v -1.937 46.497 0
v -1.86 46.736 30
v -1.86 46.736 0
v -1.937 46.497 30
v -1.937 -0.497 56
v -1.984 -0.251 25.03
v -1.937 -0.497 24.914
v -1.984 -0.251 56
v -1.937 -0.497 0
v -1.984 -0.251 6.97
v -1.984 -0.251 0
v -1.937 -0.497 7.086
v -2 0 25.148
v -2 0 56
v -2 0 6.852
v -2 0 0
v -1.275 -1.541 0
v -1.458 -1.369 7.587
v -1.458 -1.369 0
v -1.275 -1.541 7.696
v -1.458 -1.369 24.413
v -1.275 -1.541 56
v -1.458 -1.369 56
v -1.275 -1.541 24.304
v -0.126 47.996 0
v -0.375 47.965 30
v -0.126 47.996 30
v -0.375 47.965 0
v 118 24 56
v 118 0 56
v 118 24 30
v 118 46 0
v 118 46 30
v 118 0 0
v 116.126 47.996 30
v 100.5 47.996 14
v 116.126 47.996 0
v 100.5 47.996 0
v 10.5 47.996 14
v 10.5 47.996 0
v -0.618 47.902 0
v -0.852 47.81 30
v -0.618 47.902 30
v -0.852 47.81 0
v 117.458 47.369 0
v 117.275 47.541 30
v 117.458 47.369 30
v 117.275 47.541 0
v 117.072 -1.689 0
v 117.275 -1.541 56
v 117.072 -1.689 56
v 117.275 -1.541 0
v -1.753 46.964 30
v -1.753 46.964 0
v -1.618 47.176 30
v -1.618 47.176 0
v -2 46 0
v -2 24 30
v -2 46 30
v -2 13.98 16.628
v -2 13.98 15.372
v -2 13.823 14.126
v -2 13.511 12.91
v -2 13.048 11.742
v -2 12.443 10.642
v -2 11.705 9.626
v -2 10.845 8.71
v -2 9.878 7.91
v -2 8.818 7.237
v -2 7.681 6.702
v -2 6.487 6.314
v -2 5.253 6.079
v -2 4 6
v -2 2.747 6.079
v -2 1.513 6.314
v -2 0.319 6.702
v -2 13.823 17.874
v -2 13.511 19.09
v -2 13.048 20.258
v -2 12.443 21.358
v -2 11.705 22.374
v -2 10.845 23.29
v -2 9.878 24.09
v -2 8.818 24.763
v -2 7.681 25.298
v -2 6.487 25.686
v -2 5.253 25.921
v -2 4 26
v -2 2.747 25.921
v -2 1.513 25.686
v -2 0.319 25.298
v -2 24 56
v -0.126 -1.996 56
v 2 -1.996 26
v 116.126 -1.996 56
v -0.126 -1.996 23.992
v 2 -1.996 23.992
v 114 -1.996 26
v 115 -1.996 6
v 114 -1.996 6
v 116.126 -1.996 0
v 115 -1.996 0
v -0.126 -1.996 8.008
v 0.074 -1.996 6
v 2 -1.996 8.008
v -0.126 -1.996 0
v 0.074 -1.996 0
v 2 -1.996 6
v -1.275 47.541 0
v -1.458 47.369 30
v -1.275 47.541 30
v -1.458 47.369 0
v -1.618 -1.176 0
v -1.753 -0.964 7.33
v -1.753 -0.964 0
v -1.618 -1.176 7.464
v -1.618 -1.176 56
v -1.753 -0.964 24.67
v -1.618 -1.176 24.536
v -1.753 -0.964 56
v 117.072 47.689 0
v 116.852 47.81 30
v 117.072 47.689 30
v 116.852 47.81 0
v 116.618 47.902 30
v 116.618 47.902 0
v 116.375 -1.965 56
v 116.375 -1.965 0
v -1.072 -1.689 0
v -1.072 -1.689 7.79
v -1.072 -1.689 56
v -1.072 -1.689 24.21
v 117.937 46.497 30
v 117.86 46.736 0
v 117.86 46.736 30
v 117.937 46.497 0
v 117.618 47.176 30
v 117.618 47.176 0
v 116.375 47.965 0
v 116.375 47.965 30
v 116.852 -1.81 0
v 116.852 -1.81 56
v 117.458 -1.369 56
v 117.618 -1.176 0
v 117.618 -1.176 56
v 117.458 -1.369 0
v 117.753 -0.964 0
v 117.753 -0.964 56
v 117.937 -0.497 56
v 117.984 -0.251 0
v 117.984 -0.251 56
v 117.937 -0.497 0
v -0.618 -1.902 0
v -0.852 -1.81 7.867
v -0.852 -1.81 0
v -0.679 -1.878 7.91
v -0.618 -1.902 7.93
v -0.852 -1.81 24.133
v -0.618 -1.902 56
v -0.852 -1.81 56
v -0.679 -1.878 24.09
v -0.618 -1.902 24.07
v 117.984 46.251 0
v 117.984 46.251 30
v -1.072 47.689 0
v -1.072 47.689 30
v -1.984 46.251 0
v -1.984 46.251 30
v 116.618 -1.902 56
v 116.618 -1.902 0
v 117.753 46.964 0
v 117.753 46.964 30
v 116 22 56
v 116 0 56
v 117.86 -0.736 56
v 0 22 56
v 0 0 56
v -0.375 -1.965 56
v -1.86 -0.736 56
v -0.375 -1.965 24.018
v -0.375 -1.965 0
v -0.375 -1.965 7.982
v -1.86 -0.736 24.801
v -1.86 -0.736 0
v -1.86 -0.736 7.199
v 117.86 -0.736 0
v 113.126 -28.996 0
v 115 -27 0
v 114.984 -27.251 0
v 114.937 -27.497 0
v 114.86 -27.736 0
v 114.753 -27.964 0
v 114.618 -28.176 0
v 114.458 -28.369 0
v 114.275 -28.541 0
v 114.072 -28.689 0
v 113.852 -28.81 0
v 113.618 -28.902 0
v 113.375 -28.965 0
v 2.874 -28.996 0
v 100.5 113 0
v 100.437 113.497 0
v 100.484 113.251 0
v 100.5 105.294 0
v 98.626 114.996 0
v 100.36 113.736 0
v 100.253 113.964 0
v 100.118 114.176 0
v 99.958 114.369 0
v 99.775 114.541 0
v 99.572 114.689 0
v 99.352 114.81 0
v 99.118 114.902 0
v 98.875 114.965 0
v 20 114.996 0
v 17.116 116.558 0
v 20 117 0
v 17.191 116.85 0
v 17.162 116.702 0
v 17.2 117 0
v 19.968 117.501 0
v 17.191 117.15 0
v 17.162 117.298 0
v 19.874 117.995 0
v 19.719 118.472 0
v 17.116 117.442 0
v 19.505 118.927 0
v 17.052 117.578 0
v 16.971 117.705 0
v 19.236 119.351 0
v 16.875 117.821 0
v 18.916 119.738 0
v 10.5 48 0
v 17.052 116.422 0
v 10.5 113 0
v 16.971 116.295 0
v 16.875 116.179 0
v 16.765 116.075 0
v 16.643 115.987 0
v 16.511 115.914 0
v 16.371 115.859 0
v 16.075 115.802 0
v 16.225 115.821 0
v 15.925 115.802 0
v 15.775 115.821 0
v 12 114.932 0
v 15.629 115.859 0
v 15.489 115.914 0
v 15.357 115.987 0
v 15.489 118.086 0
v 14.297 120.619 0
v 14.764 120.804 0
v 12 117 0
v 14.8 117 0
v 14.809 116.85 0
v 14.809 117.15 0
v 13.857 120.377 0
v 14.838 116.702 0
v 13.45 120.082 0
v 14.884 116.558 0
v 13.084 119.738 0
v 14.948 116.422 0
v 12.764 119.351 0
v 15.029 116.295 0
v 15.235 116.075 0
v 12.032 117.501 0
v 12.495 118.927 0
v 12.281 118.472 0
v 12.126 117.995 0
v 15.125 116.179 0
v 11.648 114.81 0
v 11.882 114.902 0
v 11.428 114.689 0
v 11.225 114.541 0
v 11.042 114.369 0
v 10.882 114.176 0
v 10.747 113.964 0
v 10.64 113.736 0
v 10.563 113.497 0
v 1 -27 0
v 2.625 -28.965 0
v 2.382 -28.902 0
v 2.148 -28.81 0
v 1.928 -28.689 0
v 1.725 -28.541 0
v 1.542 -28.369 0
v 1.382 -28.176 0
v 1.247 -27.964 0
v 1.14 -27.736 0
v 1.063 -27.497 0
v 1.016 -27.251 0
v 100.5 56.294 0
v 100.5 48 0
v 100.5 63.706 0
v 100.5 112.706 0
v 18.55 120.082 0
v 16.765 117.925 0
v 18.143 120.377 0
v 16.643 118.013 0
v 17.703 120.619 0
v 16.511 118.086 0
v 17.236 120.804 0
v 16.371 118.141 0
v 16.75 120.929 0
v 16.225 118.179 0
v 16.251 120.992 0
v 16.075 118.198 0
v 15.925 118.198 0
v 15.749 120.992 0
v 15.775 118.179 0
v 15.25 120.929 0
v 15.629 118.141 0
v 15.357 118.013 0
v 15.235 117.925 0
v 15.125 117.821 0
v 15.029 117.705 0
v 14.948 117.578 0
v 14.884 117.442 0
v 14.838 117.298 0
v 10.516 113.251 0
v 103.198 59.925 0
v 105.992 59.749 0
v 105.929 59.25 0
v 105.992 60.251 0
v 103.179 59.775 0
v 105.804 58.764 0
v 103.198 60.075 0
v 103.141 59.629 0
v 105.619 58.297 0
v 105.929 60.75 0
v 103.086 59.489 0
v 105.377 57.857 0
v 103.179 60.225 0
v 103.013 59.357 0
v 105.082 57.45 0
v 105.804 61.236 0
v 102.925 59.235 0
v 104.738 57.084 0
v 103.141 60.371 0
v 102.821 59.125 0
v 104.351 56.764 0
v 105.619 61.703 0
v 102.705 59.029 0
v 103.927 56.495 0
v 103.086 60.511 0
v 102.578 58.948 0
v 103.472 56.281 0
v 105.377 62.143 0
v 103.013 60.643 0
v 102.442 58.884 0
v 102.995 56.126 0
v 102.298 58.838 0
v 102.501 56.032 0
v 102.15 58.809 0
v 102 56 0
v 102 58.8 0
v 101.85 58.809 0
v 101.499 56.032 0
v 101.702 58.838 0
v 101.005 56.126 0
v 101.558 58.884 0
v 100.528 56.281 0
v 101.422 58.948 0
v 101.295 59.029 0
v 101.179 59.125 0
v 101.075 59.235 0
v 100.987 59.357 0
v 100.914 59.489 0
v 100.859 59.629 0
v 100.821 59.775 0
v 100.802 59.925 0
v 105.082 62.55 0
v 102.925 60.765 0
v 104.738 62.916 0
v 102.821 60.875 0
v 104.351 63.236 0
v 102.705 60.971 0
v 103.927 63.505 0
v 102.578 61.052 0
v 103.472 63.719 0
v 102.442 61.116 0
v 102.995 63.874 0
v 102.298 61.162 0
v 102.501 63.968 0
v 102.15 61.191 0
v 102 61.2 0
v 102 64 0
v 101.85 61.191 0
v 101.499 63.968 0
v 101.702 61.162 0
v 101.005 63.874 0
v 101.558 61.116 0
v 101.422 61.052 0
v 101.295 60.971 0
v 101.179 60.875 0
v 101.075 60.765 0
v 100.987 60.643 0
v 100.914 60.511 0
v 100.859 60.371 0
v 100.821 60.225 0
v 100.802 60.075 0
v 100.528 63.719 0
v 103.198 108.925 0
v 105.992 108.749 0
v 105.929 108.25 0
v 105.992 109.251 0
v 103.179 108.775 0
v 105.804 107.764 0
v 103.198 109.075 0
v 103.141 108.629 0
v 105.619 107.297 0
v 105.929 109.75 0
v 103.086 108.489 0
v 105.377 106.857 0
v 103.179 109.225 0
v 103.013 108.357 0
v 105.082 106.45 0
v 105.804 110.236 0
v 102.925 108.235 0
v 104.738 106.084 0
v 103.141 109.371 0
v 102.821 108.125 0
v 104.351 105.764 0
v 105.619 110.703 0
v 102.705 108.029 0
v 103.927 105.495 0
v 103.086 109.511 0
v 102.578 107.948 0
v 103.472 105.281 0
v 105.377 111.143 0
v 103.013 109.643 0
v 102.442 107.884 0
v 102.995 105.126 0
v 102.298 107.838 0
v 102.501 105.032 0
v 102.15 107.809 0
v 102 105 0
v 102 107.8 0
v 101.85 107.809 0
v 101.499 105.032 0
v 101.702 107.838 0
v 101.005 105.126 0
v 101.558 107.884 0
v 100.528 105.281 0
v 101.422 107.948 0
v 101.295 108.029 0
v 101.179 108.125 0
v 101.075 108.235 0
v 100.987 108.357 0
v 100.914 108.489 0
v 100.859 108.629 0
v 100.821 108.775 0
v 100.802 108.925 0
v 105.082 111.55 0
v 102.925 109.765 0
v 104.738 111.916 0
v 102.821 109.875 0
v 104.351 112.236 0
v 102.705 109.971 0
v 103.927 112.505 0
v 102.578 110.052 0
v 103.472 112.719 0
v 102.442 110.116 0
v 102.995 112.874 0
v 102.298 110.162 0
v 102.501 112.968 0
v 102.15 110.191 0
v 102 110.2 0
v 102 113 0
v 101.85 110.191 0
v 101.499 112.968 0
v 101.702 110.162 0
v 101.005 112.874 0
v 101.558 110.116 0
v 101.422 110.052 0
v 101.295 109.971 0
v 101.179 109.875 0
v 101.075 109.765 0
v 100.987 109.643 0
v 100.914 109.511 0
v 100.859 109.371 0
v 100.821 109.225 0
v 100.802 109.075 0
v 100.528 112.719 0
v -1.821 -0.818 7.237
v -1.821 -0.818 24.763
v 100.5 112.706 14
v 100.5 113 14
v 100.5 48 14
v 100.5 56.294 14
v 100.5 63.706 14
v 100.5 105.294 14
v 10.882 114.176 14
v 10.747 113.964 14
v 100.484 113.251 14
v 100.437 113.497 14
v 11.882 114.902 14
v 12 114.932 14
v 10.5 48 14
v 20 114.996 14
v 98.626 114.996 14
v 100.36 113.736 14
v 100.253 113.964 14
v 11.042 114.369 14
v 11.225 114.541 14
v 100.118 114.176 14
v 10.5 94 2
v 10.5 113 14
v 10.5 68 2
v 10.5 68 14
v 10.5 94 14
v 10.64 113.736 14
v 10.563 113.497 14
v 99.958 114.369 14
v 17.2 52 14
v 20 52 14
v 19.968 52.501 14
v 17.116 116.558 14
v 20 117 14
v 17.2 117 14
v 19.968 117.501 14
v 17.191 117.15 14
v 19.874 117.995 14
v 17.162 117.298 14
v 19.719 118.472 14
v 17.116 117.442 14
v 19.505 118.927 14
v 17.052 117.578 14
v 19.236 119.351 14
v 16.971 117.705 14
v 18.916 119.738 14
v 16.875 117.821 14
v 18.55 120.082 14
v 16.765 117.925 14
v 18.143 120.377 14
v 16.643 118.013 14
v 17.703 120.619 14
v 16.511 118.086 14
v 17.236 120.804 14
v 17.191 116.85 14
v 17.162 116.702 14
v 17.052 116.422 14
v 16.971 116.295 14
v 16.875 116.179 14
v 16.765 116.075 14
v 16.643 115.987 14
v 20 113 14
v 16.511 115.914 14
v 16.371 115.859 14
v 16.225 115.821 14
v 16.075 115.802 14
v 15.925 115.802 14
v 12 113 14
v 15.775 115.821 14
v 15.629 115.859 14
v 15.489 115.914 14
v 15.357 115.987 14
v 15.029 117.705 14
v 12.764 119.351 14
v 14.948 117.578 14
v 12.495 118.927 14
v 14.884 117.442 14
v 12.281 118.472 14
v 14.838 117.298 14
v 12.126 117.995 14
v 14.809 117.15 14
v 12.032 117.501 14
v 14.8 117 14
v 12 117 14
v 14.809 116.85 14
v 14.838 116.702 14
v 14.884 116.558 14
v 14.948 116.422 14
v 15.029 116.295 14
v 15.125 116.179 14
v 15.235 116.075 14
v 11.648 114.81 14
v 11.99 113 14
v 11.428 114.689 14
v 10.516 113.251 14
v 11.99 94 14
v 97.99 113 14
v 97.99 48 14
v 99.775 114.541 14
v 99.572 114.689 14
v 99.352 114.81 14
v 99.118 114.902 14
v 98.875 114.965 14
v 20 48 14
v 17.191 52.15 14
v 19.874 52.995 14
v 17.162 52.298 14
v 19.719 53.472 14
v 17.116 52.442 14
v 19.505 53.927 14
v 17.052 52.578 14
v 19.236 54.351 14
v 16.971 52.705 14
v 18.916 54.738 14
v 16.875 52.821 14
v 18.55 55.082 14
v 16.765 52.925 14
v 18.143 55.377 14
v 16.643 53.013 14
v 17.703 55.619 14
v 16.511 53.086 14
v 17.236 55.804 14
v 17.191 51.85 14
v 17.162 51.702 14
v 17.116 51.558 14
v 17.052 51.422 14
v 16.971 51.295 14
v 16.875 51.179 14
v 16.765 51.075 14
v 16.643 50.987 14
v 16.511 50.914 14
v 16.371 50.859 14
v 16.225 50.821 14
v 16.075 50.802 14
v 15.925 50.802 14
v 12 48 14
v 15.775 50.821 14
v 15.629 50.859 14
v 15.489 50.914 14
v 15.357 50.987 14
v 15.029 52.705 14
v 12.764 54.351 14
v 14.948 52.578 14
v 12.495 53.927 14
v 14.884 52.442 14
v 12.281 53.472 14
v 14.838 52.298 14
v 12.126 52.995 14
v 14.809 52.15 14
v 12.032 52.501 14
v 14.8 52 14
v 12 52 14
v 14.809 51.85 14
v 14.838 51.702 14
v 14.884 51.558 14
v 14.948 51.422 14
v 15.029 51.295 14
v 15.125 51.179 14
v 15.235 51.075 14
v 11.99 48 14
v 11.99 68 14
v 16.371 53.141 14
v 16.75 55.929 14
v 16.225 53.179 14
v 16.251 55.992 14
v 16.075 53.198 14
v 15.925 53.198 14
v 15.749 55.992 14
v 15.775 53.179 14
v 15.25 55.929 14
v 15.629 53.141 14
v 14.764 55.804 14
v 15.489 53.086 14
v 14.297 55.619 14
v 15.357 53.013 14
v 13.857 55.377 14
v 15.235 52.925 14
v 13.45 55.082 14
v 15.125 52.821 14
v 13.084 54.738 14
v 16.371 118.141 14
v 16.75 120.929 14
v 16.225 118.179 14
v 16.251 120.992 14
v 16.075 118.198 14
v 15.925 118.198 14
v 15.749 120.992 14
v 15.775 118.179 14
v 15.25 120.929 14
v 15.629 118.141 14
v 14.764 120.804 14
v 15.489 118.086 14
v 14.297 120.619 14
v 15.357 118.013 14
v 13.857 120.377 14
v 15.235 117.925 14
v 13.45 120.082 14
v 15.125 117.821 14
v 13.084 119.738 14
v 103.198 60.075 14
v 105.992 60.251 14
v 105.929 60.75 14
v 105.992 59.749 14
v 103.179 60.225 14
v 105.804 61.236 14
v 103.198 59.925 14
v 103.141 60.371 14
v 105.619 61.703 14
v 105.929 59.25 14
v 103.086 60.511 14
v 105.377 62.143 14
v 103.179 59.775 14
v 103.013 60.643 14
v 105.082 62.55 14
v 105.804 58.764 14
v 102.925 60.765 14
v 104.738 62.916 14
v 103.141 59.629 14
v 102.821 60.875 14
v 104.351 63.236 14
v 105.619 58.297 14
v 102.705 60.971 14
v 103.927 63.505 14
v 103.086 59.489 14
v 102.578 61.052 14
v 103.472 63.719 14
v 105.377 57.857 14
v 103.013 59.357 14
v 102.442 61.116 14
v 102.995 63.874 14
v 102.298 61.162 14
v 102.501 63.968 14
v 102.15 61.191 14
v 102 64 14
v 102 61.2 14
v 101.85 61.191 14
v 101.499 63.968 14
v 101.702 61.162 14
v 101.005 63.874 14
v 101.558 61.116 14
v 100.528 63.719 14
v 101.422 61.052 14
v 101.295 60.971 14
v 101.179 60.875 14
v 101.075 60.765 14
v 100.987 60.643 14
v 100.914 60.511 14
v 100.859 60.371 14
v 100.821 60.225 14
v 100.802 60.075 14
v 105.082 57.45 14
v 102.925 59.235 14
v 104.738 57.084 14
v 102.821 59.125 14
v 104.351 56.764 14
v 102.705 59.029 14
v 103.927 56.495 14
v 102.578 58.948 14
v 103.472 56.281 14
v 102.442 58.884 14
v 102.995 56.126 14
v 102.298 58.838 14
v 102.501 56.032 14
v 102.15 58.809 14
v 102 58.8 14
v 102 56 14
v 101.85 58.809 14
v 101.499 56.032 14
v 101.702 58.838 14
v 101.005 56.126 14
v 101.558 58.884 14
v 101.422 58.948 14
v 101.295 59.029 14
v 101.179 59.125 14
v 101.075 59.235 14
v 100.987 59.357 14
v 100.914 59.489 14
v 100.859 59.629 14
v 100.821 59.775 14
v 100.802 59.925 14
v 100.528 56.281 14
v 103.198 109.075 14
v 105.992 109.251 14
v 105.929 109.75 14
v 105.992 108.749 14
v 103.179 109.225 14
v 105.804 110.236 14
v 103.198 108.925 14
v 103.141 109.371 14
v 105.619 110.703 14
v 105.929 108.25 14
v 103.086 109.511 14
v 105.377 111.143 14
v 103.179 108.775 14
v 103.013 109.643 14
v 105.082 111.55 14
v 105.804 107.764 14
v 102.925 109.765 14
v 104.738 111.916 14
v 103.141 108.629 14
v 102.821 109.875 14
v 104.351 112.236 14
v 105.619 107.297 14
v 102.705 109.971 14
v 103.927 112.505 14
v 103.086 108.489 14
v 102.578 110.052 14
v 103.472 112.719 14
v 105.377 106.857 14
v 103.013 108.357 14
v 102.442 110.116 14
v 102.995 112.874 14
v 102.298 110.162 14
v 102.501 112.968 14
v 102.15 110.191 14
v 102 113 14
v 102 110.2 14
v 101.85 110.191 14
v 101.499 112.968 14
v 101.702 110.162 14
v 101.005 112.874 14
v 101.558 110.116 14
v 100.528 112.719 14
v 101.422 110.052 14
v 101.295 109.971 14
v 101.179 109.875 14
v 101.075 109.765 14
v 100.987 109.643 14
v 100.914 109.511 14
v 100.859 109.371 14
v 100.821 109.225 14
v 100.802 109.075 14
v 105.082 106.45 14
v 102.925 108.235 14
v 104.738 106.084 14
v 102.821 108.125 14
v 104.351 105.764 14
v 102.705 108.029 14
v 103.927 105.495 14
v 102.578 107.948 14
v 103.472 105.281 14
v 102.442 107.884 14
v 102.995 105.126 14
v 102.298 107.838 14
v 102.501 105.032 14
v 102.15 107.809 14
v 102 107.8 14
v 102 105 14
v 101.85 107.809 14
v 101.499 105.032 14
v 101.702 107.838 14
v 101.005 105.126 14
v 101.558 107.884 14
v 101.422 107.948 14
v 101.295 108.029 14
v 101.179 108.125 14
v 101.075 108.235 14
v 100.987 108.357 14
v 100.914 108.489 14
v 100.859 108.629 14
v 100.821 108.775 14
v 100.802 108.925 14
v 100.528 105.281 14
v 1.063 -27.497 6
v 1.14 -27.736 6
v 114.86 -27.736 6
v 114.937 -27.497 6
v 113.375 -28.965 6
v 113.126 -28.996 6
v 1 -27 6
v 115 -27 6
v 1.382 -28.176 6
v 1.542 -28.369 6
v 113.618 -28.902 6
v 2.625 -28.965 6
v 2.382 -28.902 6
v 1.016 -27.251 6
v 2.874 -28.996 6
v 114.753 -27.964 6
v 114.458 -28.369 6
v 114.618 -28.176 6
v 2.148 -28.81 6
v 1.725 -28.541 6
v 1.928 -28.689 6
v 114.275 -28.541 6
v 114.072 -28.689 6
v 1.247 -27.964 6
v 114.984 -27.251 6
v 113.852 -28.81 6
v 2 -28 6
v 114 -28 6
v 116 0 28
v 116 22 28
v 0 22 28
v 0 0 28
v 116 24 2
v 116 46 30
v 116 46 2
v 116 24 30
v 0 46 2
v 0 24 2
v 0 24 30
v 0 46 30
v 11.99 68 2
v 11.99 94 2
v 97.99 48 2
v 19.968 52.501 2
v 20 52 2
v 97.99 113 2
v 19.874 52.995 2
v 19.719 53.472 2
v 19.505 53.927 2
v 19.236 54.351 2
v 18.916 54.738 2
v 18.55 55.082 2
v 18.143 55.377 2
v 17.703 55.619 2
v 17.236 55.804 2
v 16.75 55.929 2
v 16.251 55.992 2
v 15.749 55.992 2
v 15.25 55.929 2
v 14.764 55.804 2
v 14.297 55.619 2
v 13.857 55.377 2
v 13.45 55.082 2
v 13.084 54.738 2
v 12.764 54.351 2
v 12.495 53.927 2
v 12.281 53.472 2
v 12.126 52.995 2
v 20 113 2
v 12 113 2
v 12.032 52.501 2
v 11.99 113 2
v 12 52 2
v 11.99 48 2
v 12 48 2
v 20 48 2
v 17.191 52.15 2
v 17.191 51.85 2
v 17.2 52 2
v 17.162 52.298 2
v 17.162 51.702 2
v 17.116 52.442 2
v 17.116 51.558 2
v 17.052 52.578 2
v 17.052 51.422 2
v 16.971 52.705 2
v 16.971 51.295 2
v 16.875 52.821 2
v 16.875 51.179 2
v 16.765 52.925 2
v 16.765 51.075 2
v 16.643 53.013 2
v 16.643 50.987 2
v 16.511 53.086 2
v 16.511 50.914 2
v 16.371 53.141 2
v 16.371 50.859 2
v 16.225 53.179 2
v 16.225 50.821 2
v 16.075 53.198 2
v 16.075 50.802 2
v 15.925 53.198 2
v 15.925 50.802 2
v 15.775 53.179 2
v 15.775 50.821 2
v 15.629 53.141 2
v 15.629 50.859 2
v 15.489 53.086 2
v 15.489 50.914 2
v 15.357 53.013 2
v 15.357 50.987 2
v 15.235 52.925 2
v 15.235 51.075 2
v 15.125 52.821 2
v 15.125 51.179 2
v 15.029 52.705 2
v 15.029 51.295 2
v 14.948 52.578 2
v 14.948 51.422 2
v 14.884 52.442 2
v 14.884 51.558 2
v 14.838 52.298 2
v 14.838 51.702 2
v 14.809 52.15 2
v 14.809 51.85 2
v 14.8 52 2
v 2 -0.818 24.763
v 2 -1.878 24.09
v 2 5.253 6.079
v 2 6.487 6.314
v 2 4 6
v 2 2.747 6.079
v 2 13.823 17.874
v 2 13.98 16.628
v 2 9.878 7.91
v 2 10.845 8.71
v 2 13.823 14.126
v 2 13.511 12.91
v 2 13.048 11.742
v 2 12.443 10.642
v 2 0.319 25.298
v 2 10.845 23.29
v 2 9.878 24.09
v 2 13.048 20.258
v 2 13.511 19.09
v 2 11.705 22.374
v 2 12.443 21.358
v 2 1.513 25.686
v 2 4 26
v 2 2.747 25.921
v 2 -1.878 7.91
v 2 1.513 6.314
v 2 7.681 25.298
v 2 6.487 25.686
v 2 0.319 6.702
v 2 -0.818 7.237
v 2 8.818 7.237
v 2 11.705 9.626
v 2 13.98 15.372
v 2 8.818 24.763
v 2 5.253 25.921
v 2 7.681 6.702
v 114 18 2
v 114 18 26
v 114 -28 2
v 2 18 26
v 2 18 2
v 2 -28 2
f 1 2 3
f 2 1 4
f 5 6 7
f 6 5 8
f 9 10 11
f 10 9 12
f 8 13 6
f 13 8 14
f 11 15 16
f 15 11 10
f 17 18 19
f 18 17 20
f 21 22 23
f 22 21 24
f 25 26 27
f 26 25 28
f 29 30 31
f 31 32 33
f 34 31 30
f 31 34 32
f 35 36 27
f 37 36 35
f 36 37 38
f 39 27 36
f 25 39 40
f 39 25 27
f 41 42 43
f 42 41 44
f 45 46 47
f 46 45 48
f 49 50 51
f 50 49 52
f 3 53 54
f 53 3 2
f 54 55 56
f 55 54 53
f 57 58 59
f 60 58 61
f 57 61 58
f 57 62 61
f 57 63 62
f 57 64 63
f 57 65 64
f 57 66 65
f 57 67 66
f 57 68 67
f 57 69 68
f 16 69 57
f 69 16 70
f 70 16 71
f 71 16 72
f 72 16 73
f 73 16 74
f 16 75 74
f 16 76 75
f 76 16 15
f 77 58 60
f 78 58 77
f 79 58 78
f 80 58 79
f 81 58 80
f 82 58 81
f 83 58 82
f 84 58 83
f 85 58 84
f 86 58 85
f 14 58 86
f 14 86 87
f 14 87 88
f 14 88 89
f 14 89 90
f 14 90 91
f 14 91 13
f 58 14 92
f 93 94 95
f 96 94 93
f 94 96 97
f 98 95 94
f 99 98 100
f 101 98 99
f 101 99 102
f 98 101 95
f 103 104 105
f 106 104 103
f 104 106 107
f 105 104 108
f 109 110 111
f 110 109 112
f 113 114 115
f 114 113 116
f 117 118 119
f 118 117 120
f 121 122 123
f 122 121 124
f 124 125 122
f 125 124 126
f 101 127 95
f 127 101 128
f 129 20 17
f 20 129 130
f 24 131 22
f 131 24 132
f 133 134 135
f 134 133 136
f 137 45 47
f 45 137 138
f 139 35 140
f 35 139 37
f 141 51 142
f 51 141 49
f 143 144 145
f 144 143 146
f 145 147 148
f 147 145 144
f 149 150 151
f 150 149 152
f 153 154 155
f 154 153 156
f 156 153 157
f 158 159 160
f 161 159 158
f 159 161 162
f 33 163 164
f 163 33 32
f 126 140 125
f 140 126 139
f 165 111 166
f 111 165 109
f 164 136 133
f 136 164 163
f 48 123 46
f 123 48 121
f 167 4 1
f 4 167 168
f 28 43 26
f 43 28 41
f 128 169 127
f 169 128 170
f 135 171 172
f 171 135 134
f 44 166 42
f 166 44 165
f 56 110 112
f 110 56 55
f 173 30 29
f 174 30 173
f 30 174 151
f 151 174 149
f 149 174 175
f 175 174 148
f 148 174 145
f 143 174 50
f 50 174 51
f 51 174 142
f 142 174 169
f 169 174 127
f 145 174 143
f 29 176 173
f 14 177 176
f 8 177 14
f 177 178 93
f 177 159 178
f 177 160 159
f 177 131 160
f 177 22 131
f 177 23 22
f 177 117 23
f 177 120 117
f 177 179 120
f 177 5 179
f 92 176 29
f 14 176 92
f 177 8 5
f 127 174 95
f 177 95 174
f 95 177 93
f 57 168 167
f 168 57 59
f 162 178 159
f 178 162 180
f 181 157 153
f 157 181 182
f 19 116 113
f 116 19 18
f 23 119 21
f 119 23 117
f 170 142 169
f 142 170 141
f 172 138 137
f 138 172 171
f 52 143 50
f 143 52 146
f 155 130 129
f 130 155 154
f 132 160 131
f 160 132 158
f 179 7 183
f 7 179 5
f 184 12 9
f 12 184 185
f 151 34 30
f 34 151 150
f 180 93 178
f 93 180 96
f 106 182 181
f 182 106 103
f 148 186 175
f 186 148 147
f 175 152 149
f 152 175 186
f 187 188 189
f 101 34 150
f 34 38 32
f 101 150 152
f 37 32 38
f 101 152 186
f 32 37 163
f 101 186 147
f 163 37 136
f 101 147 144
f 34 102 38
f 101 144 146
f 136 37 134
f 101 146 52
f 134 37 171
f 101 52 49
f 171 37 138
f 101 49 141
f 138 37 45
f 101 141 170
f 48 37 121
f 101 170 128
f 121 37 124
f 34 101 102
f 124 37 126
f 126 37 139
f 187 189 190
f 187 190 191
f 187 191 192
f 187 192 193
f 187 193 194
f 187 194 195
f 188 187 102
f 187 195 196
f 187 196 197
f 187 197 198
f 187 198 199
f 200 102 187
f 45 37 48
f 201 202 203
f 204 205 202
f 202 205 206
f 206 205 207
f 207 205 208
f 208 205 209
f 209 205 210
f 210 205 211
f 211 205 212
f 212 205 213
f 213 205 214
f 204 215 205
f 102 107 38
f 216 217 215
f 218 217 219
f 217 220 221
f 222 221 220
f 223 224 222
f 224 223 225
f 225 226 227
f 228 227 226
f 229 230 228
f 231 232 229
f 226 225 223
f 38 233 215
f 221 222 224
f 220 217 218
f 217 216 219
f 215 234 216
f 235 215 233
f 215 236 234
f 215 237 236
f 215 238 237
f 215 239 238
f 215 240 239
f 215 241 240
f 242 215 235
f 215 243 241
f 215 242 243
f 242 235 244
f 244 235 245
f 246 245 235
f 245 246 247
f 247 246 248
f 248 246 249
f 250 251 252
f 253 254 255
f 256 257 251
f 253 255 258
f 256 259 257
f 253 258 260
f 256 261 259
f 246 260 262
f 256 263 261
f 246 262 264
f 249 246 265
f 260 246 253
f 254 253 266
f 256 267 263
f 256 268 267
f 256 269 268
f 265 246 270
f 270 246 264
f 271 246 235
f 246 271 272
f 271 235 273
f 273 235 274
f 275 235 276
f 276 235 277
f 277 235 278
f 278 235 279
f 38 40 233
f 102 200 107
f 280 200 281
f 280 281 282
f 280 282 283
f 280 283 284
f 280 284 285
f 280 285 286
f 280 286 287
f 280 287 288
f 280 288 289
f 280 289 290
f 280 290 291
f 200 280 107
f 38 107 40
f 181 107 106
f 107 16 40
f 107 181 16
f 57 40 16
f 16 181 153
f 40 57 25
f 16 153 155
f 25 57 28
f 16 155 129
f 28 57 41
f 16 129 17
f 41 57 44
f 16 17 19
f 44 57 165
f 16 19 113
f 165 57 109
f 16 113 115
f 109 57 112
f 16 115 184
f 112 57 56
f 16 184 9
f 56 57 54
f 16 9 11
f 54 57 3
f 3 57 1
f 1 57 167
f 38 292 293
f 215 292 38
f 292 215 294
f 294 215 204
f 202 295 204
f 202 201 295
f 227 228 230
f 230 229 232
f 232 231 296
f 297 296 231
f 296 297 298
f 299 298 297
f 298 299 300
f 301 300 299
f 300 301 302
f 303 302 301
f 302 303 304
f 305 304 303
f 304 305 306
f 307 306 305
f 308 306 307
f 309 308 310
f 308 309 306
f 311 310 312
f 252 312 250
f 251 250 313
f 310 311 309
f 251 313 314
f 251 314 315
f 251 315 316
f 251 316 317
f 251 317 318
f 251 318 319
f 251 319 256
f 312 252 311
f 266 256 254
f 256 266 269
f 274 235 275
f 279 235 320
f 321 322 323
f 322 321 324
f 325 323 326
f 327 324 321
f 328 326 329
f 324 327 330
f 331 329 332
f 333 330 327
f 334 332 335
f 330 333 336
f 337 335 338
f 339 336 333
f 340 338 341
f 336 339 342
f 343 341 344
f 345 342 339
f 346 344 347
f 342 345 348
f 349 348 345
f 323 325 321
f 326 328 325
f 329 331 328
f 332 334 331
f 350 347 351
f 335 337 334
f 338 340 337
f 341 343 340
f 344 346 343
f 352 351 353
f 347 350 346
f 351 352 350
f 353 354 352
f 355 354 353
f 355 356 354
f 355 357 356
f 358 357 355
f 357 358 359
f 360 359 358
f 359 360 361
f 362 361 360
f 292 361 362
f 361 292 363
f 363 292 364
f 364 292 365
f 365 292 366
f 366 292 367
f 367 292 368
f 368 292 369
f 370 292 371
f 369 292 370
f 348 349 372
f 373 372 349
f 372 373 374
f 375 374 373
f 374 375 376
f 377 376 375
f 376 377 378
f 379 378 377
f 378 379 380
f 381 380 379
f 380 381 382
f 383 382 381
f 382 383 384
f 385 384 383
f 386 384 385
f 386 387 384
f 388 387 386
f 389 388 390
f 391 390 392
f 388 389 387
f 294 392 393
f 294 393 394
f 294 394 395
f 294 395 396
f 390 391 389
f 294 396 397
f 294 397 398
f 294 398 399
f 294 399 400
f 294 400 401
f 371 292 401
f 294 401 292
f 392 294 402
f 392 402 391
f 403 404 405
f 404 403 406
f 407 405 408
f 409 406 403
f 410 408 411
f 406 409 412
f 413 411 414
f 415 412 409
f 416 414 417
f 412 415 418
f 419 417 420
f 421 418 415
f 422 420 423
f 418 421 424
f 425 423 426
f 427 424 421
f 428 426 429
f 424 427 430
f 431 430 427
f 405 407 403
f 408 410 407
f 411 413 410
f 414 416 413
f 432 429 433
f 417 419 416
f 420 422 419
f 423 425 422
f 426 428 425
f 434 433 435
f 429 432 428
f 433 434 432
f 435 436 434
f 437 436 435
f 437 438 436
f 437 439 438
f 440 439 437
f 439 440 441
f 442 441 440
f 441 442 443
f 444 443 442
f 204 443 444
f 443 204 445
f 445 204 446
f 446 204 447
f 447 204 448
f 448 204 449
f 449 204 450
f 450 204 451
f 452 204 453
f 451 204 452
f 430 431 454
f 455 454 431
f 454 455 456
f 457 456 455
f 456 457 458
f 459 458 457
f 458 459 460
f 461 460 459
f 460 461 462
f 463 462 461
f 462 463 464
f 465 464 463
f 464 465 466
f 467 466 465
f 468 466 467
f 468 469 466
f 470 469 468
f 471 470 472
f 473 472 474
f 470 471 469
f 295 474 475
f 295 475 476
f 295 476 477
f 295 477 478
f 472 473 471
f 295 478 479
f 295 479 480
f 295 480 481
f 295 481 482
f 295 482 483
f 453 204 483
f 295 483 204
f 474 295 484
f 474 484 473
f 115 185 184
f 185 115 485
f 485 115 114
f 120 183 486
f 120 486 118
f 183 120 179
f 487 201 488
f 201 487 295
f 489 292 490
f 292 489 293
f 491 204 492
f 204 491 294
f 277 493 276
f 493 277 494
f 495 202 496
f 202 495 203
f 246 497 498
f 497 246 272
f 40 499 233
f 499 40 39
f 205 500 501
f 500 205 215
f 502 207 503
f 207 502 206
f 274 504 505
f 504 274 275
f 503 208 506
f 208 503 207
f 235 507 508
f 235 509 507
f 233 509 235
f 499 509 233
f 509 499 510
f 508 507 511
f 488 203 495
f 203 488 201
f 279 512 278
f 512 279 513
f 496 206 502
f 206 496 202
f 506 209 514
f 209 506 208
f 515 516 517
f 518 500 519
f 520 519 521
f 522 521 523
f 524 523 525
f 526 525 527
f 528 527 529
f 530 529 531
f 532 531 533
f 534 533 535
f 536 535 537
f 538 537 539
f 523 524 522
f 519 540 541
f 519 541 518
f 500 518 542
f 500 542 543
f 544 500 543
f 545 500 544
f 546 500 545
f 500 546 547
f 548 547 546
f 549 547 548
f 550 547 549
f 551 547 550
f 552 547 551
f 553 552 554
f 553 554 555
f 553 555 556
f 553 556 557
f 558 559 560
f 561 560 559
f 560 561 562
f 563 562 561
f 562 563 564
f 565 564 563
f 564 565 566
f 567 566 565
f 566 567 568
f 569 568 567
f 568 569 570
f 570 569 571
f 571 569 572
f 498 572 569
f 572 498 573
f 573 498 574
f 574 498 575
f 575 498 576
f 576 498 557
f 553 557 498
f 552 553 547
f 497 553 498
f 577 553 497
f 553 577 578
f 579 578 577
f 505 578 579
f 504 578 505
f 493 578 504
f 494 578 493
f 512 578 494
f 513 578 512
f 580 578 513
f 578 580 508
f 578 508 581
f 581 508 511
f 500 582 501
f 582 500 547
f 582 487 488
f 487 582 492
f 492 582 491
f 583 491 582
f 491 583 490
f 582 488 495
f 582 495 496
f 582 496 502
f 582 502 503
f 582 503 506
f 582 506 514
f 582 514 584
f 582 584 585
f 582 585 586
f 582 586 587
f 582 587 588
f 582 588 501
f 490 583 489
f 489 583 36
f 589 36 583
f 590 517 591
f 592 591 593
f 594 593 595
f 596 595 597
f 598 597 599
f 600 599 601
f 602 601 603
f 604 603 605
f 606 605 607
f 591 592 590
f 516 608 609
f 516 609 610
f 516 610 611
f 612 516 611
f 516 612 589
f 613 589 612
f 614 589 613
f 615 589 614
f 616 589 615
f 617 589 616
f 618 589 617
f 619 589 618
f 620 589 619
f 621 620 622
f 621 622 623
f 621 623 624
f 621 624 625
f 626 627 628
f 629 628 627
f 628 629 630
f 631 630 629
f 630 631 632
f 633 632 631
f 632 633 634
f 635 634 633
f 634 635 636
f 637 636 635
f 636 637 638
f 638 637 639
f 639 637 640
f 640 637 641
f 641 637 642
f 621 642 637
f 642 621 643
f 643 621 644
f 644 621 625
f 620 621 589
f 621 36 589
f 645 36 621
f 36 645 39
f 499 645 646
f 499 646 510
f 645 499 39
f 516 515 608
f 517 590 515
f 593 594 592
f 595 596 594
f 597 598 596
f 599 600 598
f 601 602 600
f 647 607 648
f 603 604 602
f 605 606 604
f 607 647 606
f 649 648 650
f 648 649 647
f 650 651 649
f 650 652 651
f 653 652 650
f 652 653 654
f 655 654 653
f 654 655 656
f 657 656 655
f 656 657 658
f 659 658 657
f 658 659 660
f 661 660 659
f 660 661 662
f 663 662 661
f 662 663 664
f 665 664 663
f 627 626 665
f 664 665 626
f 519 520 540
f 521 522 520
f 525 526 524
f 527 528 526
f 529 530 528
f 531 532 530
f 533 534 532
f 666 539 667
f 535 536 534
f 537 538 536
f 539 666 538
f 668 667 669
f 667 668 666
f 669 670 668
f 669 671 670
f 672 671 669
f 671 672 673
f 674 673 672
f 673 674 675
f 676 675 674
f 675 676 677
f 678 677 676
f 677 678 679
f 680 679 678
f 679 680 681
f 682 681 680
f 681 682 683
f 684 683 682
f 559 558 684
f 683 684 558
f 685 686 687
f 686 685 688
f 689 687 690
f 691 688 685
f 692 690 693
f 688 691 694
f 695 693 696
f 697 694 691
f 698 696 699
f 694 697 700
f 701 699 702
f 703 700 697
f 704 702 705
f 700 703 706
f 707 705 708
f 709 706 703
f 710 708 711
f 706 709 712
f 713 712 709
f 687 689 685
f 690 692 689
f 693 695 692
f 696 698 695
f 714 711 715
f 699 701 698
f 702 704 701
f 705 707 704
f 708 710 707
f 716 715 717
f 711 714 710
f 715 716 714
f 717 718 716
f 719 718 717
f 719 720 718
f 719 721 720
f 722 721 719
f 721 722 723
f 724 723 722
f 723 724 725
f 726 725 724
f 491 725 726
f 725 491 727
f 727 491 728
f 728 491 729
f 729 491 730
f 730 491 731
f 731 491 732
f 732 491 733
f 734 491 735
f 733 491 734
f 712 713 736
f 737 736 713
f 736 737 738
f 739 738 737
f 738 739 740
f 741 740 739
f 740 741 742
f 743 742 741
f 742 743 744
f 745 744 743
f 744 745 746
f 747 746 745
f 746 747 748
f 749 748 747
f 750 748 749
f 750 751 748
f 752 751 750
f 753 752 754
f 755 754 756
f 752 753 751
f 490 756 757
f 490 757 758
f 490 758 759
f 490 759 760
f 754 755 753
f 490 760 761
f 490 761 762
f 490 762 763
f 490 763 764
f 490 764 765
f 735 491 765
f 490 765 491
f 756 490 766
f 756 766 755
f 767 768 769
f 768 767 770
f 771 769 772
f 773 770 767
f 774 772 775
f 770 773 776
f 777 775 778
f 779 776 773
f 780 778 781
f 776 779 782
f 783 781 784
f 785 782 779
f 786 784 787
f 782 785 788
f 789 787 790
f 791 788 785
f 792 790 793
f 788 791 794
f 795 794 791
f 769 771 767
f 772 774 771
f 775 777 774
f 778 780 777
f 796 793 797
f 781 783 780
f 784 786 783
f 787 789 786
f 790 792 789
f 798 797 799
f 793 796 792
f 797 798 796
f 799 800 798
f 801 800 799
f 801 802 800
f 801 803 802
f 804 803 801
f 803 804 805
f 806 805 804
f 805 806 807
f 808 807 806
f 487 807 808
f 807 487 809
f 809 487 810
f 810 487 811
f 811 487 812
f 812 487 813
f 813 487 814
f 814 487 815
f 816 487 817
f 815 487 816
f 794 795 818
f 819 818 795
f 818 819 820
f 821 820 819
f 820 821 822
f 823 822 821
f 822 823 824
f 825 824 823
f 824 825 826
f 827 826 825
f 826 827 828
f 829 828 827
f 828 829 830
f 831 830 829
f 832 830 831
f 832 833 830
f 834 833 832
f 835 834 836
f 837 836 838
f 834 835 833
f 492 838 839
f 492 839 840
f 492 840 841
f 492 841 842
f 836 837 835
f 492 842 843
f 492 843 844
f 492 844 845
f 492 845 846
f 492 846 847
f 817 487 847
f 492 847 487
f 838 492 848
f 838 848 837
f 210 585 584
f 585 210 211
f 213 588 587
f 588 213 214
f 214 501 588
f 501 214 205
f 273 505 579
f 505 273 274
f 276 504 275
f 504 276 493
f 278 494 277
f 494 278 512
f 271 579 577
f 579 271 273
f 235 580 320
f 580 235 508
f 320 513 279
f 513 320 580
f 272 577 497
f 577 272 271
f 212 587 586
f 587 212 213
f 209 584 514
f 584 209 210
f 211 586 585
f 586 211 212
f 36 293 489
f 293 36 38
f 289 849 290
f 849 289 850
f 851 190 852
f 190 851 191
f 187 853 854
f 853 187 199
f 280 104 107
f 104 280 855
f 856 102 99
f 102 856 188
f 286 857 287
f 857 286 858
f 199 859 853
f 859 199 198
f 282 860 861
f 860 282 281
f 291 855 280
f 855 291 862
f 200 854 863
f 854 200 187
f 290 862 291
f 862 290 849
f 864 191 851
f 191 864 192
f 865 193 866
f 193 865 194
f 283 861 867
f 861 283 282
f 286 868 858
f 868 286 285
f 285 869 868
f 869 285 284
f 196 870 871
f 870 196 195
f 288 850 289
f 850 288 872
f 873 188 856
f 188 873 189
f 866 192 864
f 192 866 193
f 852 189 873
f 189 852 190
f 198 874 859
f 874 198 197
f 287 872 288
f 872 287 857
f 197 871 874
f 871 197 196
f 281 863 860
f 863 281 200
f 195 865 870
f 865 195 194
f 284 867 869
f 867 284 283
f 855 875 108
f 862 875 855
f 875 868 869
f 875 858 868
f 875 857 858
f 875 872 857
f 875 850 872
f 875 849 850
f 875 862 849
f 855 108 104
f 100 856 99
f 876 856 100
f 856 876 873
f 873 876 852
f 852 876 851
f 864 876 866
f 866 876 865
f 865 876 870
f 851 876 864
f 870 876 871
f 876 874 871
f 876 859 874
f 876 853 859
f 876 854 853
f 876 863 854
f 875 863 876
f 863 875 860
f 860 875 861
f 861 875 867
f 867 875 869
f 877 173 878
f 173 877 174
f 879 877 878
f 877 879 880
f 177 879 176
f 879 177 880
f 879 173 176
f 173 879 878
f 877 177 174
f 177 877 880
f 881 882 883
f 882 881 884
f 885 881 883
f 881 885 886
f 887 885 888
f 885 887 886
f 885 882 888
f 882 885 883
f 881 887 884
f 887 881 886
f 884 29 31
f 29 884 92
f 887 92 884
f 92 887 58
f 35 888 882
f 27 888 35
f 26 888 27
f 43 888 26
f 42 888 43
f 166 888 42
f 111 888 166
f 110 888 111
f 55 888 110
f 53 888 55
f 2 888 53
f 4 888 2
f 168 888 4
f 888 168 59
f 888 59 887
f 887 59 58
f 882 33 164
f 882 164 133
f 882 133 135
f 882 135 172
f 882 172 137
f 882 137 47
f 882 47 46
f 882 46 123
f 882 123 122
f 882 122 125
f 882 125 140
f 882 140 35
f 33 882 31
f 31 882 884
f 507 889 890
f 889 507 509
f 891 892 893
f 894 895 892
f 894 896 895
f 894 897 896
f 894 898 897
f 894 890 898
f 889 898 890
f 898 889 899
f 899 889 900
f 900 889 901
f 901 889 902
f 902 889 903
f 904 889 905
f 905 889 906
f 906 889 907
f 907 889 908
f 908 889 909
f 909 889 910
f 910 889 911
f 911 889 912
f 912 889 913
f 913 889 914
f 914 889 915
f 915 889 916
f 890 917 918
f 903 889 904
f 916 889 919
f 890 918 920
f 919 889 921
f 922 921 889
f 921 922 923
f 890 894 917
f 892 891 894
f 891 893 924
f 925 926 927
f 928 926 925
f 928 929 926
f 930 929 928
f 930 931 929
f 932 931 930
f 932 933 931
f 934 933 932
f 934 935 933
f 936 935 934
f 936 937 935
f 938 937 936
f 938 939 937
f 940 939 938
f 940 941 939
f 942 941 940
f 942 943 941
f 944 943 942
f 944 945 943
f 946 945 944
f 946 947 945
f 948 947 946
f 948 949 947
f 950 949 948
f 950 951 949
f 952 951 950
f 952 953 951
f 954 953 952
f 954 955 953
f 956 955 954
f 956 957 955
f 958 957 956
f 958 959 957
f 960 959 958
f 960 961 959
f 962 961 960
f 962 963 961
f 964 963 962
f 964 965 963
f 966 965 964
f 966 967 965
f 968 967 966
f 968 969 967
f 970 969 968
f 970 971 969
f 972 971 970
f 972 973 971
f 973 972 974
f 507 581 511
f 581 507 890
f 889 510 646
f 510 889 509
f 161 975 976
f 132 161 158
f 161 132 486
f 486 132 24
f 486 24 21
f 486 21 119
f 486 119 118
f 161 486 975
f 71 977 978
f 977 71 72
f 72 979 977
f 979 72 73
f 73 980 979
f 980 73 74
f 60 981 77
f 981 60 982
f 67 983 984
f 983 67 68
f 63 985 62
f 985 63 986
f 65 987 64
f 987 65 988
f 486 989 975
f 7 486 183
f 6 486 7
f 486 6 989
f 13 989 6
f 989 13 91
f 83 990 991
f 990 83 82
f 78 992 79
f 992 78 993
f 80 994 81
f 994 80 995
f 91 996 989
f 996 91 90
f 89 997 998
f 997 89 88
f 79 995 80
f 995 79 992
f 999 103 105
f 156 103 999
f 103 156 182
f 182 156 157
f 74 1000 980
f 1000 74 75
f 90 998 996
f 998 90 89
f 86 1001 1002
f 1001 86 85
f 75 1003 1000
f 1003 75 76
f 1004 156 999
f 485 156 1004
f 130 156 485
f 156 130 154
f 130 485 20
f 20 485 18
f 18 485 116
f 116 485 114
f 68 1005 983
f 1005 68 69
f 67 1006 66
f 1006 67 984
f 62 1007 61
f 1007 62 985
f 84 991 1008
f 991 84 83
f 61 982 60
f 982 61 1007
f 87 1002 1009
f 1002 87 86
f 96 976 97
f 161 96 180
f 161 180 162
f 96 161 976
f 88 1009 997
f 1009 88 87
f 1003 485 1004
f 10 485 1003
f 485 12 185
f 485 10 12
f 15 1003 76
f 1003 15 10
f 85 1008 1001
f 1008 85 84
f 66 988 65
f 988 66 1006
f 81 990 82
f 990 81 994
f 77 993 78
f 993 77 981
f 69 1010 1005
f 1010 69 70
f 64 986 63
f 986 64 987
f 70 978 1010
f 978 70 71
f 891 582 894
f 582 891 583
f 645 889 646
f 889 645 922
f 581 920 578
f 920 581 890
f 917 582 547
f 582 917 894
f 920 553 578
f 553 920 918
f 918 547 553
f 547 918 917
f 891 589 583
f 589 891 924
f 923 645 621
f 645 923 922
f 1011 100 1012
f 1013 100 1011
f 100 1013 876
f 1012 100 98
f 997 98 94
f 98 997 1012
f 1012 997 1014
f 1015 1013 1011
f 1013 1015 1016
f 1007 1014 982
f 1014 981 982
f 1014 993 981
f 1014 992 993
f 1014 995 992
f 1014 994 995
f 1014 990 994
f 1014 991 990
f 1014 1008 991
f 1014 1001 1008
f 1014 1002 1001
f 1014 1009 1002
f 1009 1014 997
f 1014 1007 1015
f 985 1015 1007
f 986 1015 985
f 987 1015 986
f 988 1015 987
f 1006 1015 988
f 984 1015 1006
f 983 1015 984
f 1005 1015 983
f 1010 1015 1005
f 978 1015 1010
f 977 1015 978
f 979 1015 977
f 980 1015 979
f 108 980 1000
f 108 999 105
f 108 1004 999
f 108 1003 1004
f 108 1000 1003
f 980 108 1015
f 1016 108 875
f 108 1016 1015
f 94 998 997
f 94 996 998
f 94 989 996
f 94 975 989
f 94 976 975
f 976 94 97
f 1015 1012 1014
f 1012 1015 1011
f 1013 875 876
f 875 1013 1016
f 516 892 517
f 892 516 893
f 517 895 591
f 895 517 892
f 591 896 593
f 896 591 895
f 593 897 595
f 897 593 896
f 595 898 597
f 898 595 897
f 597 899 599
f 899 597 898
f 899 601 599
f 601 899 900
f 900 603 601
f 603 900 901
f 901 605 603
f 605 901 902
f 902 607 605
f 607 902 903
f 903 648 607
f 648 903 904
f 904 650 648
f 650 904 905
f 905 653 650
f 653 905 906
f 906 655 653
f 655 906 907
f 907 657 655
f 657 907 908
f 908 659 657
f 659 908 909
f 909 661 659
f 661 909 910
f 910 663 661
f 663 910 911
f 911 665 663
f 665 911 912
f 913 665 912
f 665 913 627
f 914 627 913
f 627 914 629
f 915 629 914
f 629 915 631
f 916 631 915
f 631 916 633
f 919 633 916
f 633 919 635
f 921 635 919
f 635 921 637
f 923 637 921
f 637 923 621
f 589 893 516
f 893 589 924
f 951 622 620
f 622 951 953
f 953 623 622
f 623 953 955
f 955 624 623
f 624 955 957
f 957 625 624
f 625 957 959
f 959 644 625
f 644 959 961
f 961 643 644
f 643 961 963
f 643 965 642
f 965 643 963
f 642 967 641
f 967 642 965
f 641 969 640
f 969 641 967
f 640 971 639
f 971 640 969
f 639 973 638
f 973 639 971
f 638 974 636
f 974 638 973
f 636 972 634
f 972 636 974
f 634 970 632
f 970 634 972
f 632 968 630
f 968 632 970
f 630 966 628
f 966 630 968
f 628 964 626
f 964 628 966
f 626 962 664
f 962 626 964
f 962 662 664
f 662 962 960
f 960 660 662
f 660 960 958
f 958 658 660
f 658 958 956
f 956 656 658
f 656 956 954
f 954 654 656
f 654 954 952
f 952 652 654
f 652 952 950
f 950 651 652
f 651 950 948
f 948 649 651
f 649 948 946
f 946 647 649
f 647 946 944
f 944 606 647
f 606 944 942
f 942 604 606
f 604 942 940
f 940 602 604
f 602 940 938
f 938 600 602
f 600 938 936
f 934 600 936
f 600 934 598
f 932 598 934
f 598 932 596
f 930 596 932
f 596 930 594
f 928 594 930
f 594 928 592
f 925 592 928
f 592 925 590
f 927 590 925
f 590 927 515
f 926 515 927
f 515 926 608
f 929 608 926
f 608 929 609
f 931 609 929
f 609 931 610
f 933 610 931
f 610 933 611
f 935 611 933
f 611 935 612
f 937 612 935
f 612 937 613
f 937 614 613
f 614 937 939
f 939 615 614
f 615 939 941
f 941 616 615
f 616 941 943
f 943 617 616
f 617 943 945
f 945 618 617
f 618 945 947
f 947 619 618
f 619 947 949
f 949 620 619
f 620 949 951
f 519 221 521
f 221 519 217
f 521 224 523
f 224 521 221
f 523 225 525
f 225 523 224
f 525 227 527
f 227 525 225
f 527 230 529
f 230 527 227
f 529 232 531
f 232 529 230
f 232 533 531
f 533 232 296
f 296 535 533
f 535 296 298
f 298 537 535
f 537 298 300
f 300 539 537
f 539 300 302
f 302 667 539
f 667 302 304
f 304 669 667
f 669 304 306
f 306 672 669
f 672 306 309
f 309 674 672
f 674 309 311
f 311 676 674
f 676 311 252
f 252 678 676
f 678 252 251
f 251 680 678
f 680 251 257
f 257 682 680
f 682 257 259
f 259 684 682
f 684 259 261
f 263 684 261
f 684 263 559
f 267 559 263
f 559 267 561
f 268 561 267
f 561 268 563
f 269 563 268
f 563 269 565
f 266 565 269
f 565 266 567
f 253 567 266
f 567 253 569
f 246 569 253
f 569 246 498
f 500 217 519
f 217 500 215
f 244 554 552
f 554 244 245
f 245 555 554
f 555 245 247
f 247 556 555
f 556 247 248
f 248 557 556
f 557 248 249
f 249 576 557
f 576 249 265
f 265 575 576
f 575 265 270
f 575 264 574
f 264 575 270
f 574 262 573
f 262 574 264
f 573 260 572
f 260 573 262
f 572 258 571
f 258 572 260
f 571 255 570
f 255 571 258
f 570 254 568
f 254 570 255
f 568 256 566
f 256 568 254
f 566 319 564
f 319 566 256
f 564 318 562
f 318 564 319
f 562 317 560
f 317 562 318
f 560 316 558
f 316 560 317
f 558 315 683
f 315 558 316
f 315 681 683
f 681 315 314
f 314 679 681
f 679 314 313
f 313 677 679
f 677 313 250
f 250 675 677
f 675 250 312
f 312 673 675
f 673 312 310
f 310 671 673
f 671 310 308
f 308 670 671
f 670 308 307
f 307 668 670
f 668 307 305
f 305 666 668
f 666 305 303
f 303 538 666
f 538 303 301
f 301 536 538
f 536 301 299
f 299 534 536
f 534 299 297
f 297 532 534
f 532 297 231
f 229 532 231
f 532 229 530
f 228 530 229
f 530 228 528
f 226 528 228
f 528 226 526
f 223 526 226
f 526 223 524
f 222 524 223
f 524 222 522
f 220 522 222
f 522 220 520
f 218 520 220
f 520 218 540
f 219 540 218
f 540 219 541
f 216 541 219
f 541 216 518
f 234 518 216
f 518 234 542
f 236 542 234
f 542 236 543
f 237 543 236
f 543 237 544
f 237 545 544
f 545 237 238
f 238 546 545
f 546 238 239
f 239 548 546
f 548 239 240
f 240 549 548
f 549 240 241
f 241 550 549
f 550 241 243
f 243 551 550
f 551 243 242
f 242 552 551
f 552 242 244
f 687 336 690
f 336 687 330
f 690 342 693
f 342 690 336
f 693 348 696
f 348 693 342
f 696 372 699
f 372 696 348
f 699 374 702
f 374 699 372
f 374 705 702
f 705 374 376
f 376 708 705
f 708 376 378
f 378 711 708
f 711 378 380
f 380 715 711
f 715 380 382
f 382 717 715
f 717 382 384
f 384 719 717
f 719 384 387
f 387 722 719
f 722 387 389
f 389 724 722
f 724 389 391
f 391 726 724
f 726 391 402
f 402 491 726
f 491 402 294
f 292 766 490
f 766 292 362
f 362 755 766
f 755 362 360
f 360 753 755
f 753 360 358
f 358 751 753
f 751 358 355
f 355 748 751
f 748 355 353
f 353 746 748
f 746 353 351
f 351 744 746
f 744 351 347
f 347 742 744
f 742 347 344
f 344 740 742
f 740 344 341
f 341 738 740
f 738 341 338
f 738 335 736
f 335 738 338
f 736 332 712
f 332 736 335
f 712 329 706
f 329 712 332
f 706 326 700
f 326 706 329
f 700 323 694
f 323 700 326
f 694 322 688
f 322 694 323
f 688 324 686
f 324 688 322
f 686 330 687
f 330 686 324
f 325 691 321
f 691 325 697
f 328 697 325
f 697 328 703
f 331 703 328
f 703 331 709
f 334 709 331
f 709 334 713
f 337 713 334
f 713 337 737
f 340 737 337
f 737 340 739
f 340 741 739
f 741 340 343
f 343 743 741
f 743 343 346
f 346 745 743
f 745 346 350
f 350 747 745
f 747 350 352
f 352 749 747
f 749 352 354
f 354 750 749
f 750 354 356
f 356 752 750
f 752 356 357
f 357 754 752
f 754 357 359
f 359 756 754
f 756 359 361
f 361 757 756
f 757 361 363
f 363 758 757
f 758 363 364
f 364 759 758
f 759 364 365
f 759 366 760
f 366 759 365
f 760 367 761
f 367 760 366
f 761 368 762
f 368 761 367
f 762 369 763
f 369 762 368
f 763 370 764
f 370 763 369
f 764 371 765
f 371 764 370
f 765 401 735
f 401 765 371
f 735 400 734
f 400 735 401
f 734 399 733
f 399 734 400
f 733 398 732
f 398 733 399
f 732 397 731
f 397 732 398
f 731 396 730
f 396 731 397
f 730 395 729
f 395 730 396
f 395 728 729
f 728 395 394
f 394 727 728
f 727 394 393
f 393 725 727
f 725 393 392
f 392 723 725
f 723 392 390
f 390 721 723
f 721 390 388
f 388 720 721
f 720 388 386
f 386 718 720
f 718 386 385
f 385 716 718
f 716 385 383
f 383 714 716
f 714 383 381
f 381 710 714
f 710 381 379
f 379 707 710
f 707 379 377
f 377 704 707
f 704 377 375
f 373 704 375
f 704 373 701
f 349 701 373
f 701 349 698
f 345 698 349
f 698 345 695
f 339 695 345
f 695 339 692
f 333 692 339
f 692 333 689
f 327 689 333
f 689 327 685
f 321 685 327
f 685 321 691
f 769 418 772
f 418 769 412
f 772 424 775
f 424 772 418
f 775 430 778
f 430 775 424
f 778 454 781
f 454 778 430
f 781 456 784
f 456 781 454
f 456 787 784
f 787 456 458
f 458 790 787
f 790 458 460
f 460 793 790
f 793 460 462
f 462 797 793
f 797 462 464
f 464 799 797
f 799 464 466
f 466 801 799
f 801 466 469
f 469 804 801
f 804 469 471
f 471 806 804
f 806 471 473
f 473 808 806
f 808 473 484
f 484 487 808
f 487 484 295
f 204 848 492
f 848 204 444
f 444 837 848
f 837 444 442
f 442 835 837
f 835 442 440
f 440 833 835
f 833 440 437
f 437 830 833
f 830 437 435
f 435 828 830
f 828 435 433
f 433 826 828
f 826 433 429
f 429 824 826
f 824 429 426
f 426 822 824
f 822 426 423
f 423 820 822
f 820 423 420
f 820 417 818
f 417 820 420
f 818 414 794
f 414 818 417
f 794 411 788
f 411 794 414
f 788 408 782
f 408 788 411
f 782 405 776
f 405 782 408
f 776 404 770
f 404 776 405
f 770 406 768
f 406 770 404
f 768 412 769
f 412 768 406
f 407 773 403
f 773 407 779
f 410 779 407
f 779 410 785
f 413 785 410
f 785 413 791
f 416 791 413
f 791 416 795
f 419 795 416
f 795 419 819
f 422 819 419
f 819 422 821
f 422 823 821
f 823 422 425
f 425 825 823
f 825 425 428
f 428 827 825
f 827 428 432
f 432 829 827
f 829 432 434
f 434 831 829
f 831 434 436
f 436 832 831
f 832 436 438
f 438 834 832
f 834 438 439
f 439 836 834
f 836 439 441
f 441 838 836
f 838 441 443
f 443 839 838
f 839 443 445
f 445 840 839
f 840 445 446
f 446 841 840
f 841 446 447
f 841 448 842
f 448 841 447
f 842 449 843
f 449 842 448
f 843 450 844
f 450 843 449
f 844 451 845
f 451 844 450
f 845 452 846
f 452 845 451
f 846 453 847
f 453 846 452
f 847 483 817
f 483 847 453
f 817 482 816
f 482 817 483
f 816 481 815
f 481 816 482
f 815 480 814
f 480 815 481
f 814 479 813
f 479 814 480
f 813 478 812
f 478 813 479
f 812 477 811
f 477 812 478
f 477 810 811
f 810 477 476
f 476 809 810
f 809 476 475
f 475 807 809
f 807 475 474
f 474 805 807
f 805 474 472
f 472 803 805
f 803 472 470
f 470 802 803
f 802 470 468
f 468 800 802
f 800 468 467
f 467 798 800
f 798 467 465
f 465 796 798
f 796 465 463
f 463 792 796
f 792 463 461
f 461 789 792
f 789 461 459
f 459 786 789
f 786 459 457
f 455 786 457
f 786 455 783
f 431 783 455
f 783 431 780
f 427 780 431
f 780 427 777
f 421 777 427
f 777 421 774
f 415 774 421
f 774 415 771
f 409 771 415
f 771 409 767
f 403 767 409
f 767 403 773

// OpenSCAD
// file: ../rpi.scad
 // include <./RPi4board-modded.scad>;



// translate([5, 61, 5])
  // rotate([0, 0, 270])
   // board_raspberrypi_4_model_b();


// rpi4([2, 2, 2], [0, 0, 2]);

def_buffer_top = 3;
def_buffer_bottom = 3;
def_buffer_left = 3;
def_buffer_right = 3;
def_buffer_front = 3;
def_buffer_back = 3;
def_padding_top = 3;
def_padding_bottom = 3;
def_padding_left = 3;
def_padding_right = 0;
def_padding_front = 3;
def_padding_back = 0;




slop=0.01;
2slop=0.02;
module rpi4(
  buffer_top = def_buffer_top, 
  buffer_bottom = def_buffer_bottom, 
  buffer_left = def_buffer_left, 
  buffer_right = def_buffer_right, 
  buffer_front = def_buffer_front, 
  buffer_back = def_buffer_back, 
  padding_top = def_padding_top, 
  padding_bottom = def_padding_bottom, 
  padding_left = def_padding_left, 
  padding_right = def_padding_right, 
  padding_front = def_padding_front, 
  padding_back = def_padding_back, 
  expose_card=false,
  expose_hdmi1=true,
  expose_hdmi2=true,
  expose_power=true,
  expose_usb1=true,
  expose_usb2=true,
  expose_audio=true,
  expose_ethernet=true,
  expose_ribbon_cable=false,
  expose_gpio_pins=false,
  head_room=4
  )
{
  rpi_screws=[58, 49, padding_bottom];
  rpi_size=[85, 56, 4];

  difference() {
    gen_rpi(
        buffer_top, 
        buffer_bottom, 
        buffer_left, 
        buffer_right, 
        buffer_front, 
        buffer_back, 
        padding_top, 
        padding_bottom, 
        padding_left, 
        padding_right, 
        padding_front, 
        padding_back, 

        rpi_screws,
        rpi_size);
  
    translate([
      buffer_left + padding_left + padding_right,
      buffer_back + padding_back,
      buffer_bottom + padding_bottom
    ]) {
      if (expose_usb1) 
        translate([rpi_size.x, 2, 1])
          cube([16, 16, 19]);

      if (expose_usb2) 
        translate([rpi_size.x, 20, 1])
          cube([16, 16, 19]);

      if (expose_ethernet)  
        translate([rpi_size.x, 38, 1])
          cube([16, 18, 17]);
    }
    translate([buffer_left + padding_left, 0, buffer_bottom + padding_bottom]) {
      if (expose_power)  
        translate([9, -slop, 0])
          cube([14, buffer_back + 2slop, 8]);

      if (expose_hdmi1)  
        translate([26.5, -slop, 0])
          cube([9, buffer_back + 2slop, 5]);

      if (expose_hdmi2)  
        translate([40, -slop, 0])
          cube([9, buffer_back + 2slop, 5]);

      if (expose_audio)  
        translate([55, -slop, 3])
          rotate([0,90,90])
            cylinder(r=2, h=buffer_back + 2slop);
    }
  }
}

module rpi0(
  rpi_buffer, 
  rpi_padding,
  expose_card=false,
  expose_hdmi=false,
  expose_usb1=false,
  expose_usb2=false,
  expose_ribbon_cable=false,
  expose_gpio_pins=false,
  head_room=4
  )
{
  rpi_screws=[58, 23, 3];
  rpi_size=[65, 30, 3];

  gen_rpi(rpi_screws, rpi_size, rpi_buffer, rpi_padding);
  
  
  
}

module gen_rpi(
    buffer_top, 
    buffer_bottom, 
    buffer_left, 
    buffer_right, 
    buffer_front, 
    buffer_back, 
    padding_top, 
    padding_bottom, 
    padding_left, 
    padding_right, 
    padding_front, 
    padding_back, 
    rpi_screws, 
    rpi_size
  )
{
  rpi_envelope=rpi_size + [2, 2, 4];

  rpi_cutout = rpi_envelope + [padding_left + padding_right, padding_back + padding_front, padding_bottom + padding_top];
  rpi_origin = [buffer_left, buffer_back, buffer_bottom];
  rpi_buffer = [buffer_left + buffer_right, buffer_back + buffer_front, buffer_bottom + buffer_top];

  difference()
  {
    union()
    {
      difference()
      {
        cube(rpi_cutout + rpi_buffer);
        translate(rpi_origin)
        cube(rpi_cutout + [0, 0, slop]);
      }
      
      translate(rpi_origin + [padding_left, padding_back, 0])
        screws(rpi_screws, padding_bottom);
    }
  }
}

module screws(rpi_screws, screw_height)
{
  screw_mount(screw_height, 0);

  translate([rpi_screws.x, 0, 0])
  screw_mount(screw_height, 90);

  translate([rpi_screws.x, rpi_screws.y, 0])
  screw_mount(screw_height, 180);

  translate([0, rpi_screws.y, 0])
  screw_mount(screw_height, 270);
}

module screw_mount(screw_mount_height, rotation)
{
  difference()
  {
    screw_diameter = 1.25;
    screw_mount_dia = 3.5;
    
    translate([screw_mount_dia/2 + 1.75, screw_mount_dia/2 + 1.75, 0])
    rotate(rotation)
    linear_extrude(screw_mount_height)
    hull() {
      mount_size = screw_mount_dia;
      circle(mount_size);
      polygon([[-mount_size, mount_size], [-mount_size,-mount_size], [mount_size,-mount_size]]);
    }
    translate([screw_mount_dia/2 + 1.75, screw_mount_dia/2 +  1.75, slop])
    cylinder(r = screw_diameter, h = screw_mount_height);
  }
}
// main file
use <../rpi.scad>;


$fn = 50;
show_caddy=false;

module __Customizer_Limit__ () {}

expose_card=false;
expose_hdmi=false;
expose_usb1=true;
expose_usb2=false;
expose_ribbon_cable=false;
expose_gpio_pins=false;

base_width=116;
base_height=56;
drive_height=30;
floor_height=2;
corner_radius=2;
slop = 0.01;
post_height=18;

usb_hub = [112,46,24];
usb_hub_overhang = 18;
usb_drive=[116,22,74];
cpu_bay=[86, 65, 26];
cpu_bay_height=14;
wall_thickness=2.0;
base_depth=usb_drive.y*2 + wall_thickness*3 + cpu_bay.y;

module chomp_stand()
{
  difference()
  {
    base();
    hd_bays();
    cpu_bay();
    cutaways();
    usb_hub_bay();
  }
  screw_posts();
}

module usb_hub_bay()
{
  translate([(base_width - usb_hub.x) / 2, usb_hub_overhang - usb_hub.y, floor_height])

  cube(usb_hub);
}

module cutaways()
{

    translate([  -4, 24, drive_height])
    linear_extrude(base_height-drive_height + floor_height)
    square([123 + slop, 24+slop]);

    translate([0, usb_drive.y*2 + wall_thickness*2 + 20, floor_height])
    linear_extrude(20)
    square([12 + slop, 26]);
  
      rotate([0,90,0])
    translate([-16,4,-2- slop])
   linear_extrude(4 + slop + slop)
   circle(10);

}

module screw_posts()
{
  translate([16, 52])
  screw_post(true);

  translate([16, 117])
  screw_post(true);

  translate([102, 60])
  rotate(90)
  screw_post(false);

  translate([102, 109])
  rotate(90)
  screw_post(false);
}

module screw_post(sqr_it)
{
  linear_extrude(cpu_bay_height)
  difference()
  {
    union()
  {
    circle(4);
    if ( sqr_it ) {
      translate([-4, -4]) square([8,4]);
    }
  }
    circle(1.2);
}
}

module cpu_bay()
{
    translate([-corner_radius - slop + 14, 48, floor_height])
    cube(cpu_bay);
}

module base()
{
    linear_extrude(base_height)
    {
      hull() {
        circle(corner_radius);
        translate([base_width,0]) circle(corner_radius);
        translate([0,usb_drive.y*2 + wall_thickness]) circle(corner_radius);
        translate([base_width, usb_drive.y*2 + wall_thickness]) circle(corner_radius);
      }
    }
    linear_extrude(cpu_bay_height)
    {
      
      offset = 12.5;
      bay_start = usb_drive.y*2 + wall_thickness*2;
      hull() {
        translate([offset,bay_start]) circle(corner_radius);
        translate([cpu_bay.x + offset, bay_start]) circle(corner_radius);
        translate([offset, bay_start + cpu_bay.y]) circle(corner_radius);
        translate([cpu_bay.x + offset, bay_start + cpu_bay.y]) circle(corner_radius);
      }
    }
    linear_extrude(floor_height*3)
    {
      hull() {
        translate([0,0]) square(corner_radius);
        translate([base_width - 3,0]) square(corner_radius);
        translate([3,-27]) circle(corner_radius);
        translate([base_width - 3, -27]) circle(corner_radius);
      }
    }
}

module hd_bays()
{
    translate([0, 0, floor_height + usb_hub.z + wall_thickness])
    cube(usb_drive);

    translate([0, 24, floor_height])
    cube(usb_drive);
}

if (show_caddy) {
  translate([106, 48, 14])
  rotate([270,180, 0])
  import("/Users/steve/Documents/scad models/chomp/chasis.STL");
}

chomp_stand();
